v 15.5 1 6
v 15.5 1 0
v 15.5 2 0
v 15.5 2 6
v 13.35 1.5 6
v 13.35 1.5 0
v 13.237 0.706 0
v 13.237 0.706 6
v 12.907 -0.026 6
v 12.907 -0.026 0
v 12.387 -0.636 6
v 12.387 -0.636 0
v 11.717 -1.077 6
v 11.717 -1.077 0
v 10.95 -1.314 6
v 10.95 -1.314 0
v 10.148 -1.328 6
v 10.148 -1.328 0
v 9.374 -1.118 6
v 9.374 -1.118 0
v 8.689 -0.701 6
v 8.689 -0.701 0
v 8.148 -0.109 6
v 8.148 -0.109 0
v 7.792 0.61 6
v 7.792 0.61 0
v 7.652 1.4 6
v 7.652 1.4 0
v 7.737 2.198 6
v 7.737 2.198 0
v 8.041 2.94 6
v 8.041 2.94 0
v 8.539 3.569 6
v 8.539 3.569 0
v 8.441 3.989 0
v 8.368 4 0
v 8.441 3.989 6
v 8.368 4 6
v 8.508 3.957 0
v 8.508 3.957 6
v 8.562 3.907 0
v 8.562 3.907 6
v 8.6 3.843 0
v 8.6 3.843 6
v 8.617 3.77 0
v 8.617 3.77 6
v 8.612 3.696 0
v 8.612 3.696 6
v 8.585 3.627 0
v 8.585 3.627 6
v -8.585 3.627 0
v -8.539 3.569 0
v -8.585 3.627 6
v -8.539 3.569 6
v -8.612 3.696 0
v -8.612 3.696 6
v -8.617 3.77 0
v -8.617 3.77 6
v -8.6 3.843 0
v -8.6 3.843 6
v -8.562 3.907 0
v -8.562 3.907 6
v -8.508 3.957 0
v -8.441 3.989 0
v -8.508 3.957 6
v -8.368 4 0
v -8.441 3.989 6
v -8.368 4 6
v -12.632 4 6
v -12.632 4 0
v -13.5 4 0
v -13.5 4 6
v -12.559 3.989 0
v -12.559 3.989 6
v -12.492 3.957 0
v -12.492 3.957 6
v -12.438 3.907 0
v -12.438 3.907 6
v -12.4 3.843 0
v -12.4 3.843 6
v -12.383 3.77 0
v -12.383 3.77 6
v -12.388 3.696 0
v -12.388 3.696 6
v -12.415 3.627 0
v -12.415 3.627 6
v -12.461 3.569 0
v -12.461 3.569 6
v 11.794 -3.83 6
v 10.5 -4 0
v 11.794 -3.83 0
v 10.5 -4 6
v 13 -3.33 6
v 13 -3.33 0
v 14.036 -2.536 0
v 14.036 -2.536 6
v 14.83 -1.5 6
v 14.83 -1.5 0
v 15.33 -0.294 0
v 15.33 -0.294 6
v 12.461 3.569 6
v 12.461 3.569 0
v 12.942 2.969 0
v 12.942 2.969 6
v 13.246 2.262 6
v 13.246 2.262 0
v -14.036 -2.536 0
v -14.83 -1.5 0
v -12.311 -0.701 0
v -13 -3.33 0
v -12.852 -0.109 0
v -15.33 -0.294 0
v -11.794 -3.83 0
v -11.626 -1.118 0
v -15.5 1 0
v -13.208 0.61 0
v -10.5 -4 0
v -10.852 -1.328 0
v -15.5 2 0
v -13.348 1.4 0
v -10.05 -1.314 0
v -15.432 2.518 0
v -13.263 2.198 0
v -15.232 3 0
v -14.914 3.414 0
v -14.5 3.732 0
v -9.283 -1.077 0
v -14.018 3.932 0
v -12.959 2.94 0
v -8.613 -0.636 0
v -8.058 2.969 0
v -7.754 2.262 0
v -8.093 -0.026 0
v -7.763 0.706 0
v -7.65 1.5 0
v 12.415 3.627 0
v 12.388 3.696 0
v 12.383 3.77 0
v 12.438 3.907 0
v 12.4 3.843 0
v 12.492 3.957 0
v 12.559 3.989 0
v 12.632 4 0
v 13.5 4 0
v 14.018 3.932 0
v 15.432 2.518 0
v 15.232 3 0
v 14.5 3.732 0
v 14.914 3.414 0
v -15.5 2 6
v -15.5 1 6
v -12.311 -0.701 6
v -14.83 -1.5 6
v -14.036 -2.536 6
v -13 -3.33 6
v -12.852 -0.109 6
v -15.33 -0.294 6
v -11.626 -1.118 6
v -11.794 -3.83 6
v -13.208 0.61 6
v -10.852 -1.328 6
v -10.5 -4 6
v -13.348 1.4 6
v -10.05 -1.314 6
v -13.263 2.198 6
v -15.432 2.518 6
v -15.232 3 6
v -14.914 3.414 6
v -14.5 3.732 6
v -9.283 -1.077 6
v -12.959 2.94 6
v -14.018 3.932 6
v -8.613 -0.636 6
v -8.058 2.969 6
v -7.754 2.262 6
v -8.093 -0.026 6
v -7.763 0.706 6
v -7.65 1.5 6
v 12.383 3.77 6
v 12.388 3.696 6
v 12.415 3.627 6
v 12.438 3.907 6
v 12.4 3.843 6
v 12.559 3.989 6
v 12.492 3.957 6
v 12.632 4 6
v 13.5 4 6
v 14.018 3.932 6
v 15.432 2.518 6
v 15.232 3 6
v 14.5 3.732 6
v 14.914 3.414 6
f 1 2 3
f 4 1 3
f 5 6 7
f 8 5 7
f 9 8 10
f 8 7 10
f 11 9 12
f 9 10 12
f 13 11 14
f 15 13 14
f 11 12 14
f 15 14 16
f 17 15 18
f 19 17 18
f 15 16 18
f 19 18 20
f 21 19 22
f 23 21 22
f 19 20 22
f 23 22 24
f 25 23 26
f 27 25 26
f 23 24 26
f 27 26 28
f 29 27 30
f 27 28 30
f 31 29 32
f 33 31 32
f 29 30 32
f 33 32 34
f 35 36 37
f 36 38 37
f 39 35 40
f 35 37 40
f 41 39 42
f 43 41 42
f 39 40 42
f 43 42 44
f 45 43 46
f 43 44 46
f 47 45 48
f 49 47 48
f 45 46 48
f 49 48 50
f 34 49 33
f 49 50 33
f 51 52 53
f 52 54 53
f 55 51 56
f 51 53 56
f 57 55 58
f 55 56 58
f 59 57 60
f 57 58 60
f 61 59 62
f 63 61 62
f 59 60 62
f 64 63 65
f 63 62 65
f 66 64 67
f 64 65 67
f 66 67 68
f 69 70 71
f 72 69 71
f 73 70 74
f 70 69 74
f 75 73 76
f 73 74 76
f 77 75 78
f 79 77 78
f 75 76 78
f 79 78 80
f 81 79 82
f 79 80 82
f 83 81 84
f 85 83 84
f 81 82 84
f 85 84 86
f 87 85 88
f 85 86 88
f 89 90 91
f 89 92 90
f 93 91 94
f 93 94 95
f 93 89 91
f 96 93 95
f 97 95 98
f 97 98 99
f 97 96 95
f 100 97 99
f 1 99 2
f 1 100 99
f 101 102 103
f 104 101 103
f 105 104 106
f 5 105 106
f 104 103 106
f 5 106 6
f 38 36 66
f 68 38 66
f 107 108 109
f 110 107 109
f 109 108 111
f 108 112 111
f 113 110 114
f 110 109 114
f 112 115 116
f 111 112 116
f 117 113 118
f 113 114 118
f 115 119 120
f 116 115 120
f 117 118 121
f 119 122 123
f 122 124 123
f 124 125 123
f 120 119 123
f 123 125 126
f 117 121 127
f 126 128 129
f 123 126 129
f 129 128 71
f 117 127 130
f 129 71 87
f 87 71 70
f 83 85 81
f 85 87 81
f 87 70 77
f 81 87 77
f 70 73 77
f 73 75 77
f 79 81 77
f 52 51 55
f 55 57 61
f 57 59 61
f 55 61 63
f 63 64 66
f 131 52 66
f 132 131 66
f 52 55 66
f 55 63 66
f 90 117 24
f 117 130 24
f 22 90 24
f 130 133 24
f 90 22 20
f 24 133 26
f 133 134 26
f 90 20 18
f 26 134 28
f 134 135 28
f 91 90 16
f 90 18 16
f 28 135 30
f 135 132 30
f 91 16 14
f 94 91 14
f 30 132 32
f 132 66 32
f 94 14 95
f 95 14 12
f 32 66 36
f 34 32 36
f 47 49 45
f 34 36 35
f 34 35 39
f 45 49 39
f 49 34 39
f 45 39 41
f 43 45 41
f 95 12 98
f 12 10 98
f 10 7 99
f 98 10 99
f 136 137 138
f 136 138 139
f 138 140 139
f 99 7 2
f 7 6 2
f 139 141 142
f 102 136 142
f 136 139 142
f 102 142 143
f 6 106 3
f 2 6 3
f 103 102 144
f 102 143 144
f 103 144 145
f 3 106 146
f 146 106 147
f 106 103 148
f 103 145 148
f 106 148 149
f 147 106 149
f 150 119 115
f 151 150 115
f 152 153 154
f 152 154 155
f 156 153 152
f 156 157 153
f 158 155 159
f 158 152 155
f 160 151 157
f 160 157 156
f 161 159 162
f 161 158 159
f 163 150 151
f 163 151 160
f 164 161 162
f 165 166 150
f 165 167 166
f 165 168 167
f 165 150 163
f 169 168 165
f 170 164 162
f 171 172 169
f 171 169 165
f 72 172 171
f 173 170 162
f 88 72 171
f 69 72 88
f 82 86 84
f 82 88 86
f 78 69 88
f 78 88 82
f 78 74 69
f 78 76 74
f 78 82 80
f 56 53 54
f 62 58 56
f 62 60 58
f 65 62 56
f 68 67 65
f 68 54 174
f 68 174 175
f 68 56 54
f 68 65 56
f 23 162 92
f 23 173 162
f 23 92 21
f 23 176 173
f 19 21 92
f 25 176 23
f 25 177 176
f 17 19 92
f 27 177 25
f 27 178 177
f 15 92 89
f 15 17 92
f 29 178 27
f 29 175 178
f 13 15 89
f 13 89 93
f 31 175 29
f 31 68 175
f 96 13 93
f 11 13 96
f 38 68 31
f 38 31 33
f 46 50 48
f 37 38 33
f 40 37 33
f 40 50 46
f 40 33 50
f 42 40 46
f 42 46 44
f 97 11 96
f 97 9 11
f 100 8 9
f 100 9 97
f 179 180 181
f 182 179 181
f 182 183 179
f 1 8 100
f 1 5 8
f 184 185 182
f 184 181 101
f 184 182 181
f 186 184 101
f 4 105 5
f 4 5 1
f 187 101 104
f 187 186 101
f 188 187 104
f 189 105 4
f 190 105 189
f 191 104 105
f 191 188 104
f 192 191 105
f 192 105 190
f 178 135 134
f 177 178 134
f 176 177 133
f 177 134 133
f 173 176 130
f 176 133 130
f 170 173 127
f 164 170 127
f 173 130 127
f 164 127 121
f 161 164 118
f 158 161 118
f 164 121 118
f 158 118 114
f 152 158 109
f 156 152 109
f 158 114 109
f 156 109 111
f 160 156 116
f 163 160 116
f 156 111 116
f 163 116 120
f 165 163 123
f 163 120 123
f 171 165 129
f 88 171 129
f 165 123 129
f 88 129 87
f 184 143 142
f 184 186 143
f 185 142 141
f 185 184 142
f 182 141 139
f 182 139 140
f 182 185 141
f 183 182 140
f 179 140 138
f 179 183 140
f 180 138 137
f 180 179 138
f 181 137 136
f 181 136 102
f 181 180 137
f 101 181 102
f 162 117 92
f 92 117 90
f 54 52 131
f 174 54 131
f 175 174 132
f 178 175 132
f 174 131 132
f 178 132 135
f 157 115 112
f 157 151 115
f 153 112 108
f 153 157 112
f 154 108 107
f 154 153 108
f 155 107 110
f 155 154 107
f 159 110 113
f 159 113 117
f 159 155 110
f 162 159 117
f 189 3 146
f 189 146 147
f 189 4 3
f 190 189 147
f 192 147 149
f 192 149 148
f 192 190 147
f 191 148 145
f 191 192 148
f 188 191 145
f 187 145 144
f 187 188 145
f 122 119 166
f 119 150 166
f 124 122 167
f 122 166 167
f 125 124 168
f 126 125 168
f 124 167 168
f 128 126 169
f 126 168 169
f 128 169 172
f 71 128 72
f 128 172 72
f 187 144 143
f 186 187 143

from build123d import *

# Parameters (mm, degrees)
F1_DEPTH = 6
F2_R     = 5
F3_R     = 2
F4_R     = 0.25


with BuildPart() as f1:
    # F0 (on Top) → F1 (new body)
    with BuildSketch(Plane.XY):
        with BuildLine():
            Line((-11.8683932183, 4), (-15.5, 4))
            Line((-15.5, 4), (-15.5, -4))
            Line((-15.5, -4), (15.5, -4))
            Line((15.5, -4), (15.5, 4))
            Line((15.5, 4), (11.8683932183, 4))
            ThreePointArc((11.8683932183, 4), (12.9517769752, 2.9530277574), (13.35, 1.5))
            ThreePointArc((13.35, 1.5), (9.0469722426, -0.9517769752), (9.1316067817, 4))
            Line((9.1316067817, 4), (-9.1316067817, 4))
            ThreePointArc((-9.1316067817, 4), (-8.0482230248, 2.9530277574), (-7.65, 1.5))
            ThreePointArc((-7.65, 1.5), (-11.9530277574, -0.9517769752), (-11.8683932183, 4))
        make_face()
    extrude(amount=F1_DEPTH)

    # F2
    f2_edges = [f1.edges().sort_by_distance(p)[0] for p in [
        (15.5, -4, 3),
        (-15.5, -4, 3),
    ]]
    fillet(f2_edges, radius=F2_R)

    # F3
    f3_edges = [f1.edges().sort_by_distance(p)[0] for p in [
        (-15.5, 4, 3),
        (15.5, 4, 3),
    ]]
    fillet(f3_edges, radius=F3_R)

    # F4
    f4_edges = [f1.edges().sort_by_distance(p)[0] for p in [
        (9.131607, 4, 3),
        (11.868393, 4, 3),
        (-9.131607, 4, 3),
        (-11.868393, 4, 3),
    ]]
    fillet(f4_edges, radius=F4_R)


solid = f1.part
